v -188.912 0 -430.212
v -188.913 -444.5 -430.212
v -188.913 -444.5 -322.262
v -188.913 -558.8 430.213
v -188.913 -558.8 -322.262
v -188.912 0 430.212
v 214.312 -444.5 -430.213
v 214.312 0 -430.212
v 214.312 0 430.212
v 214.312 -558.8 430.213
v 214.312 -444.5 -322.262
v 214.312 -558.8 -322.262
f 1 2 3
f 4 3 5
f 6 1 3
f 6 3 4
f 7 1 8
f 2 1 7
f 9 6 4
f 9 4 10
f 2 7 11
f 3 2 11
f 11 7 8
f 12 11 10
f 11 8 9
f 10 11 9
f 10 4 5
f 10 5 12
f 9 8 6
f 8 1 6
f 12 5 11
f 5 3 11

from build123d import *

# Parameters (mm, degrees)
F0_W     = 377.825
F0_H     = 860.425
F1_DEPTH = 514.35
F2_DEPTH = 25.4
F3_W     = 69.85
F3_H     = 107.95
F4_DEPTH = 403.226
F5_W     = 403.225
F5_H     = 752.475
F6_DEPTH = 44.45


with BuildPart() as f1:
    # F0 (on Front) → F1 (new body)
    with BuildSketch(Plane.XZ):
        Rectangle(F0_W, F0_H)
    extrude(amount=F1_DEPTH)

    # F2 (add): a face of the model
    f2_faces = [f1.faces().sort_by_distance(p)[0] for p in [
        (188.9125, -257.175, 0),
    ]]
    extrude(f2_faces, amount=F2_DEPTH)

    # F3 (on face) → F4 (cut, through all)
    with BuildSketch(Plane.YZ.offset(214.3125)):
        with Locations((-479.425, -376.2375)):
            Rectangle(F3_W, F3_H)
    extrude(amount=-F4_DEPTH, mode=Mode.SUBTRACT)

    # F5 (on face) → F6 (join)
    with BuildSketch(Plane.XZ.offset(514.35)):
        with Locations((12.7, 53.975)):
            Rectangle(F5_W, F5_H)
    extrude(amount=F6_DEPTH)


solid = f1.part
